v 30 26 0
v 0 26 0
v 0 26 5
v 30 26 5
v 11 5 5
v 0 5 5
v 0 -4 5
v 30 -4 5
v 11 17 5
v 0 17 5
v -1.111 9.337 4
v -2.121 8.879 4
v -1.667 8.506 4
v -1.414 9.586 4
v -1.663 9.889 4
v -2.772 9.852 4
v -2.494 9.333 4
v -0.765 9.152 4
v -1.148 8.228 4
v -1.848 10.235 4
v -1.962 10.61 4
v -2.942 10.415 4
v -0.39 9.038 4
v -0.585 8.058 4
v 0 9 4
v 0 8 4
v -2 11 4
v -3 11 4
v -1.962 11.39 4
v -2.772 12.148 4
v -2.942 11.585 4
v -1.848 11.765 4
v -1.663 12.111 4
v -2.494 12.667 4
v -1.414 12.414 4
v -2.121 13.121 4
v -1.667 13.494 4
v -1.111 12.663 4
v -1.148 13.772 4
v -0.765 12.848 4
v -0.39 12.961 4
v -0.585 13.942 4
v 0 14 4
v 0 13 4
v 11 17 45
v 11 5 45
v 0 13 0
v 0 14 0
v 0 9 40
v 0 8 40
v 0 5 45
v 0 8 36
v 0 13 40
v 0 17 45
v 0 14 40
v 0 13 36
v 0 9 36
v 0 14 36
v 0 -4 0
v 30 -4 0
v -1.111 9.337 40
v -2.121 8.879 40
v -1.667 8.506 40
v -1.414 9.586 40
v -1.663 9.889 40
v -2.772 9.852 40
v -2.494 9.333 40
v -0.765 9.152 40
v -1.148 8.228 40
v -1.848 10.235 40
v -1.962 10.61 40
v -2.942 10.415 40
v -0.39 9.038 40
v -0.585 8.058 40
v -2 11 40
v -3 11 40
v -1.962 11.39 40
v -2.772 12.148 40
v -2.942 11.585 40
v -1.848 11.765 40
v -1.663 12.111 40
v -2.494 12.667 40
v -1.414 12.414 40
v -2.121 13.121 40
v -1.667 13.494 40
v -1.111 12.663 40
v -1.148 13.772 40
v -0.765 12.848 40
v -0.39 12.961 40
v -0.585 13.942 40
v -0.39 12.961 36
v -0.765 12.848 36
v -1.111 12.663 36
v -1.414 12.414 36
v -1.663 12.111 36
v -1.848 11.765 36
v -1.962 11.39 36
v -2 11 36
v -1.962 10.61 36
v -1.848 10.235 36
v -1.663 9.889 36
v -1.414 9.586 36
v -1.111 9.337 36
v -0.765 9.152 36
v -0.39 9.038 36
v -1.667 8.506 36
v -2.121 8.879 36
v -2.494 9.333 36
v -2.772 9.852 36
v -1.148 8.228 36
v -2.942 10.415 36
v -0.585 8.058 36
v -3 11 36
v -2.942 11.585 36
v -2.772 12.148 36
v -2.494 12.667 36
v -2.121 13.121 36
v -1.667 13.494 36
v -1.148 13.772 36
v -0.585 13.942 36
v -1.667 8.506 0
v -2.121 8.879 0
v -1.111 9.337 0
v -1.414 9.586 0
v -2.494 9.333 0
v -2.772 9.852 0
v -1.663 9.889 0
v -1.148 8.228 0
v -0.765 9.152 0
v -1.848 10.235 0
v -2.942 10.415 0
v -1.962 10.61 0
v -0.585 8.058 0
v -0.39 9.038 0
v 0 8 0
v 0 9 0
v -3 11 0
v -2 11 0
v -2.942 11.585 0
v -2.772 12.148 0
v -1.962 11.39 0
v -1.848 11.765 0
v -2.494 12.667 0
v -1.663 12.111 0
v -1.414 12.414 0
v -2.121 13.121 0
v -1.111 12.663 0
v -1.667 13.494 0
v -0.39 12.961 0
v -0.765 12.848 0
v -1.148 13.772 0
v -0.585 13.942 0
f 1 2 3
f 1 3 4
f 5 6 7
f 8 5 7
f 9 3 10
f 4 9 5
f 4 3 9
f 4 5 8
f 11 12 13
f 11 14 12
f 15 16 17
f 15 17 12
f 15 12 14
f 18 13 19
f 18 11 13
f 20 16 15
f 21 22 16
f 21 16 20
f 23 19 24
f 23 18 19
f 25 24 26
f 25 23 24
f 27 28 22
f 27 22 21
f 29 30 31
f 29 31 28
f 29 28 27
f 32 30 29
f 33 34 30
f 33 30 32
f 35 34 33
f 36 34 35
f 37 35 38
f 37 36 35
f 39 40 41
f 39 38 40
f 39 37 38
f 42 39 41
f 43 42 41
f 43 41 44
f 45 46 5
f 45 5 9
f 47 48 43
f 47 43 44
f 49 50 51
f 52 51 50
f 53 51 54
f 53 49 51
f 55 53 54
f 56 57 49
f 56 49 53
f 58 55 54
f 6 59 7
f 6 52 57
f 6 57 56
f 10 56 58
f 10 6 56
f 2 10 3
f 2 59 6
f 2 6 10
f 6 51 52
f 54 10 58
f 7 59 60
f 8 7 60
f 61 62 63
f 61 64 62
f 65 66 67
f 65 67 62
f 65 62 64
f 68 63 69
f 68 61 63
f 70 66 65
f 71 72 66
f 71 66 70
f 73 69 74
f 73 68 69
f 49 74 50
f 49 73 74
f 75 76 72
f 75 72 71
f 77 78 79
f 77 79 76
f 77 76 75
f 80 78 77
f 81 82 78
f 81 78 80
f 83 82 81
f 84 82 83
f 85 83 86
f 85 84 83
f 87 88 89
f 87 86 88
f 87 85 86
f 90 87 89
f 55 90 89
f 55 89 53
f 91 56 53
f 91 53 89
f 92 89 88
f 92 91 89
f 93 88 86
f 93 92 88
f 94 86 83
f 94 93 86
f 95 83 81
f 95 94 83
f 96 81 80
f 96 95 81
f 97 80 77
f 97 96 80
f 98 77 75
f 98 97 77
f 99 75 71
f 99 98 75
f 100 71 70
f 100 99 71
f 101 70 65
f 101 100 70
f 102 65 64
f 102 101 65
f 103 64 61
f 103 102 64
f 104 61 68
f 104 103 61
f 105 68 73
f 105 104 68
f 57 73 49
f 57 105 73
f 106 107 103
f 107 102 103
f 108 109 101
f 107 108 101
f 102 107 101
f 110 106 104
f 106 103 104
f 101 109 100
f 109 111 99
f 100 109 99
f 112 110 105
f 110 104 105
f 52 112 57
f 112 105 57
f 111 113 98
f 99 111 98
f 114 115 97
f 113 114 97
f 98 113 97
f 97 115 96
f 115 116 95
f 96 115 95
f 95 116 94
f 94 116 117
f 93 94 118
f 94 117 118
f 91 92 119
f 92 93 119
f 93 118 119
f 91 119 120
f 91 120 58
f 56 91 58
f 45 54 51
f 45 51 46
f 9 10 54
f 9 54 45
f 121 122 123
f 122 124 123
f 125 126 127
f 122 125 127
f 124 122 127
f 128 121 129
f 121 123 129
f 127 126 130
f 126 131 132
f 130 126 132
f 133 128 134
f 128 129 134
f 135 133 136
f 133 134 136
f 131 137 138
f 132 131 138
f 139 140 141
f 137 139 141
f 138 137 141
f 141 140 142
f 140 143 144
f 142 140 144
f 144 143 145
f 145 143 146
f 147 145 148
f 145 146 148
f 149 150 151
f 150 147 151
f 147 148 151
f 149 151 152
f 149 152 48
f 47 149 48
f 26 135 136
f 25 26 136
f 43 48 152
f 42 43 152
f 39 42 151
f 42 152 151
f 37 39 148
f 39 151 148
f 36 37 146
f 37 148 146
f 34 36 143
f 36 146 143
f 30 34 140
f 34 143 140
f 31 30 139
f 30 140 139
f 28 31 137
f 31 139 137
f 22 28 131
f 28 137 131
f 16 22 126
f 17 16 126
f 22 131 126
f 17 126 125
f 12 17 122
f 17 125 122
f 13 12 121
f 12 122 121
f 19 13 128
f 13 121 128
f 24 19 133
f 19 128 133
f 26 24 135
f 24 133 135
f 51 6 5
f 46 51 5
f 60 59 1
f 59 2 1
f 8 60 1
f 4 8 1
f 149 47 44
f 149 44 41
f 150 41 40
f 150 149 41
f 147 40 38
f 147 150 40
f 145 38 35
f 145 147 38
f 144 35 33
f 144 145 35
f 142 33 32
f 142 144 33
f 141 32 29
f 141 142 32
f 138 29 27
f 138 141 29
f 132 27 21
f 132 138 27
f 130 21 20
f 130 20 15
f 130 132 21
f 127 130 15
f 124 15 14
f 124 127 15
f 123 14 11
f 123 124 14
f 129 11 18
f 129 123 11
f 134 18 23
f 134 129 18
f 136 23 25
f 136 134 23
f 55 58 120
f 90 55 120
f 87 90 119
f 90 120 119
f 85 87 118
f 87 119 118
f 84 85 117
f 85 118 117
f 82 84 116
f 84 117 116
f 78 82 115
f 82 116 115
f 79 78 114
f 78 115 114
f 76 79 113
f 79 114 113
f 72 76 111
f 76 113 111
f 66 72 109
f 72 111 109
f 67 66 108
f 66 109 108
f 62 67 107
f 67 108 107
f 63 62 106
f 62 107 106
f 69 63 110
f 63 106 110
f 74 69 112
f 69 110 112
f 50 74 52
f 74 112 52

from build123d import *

# Parameters (mm, degrees)
EXTRUDE002_DEPTH = 4
EXTRUDE003_DEPTH = 4
SKETCH_W         = 30
SKETCH_H         = 30
EXTRUDE_DEPTH    = 5
SKETCH001_W      = 11
SKETCH001_H      = 12
EXTRUDE001_DEPTH = 45


with BuildPart() as extrude002:
    # Sketch002 → Extrude002 (new body)
    with BuildSketch(Plane.XY):
        with BuildLine():
            ThreePointArc((0, 13.999913), (-3, 10.999913), (0, 7.999913))
            Line((0, 7.999913), (0, 8.999913))
            ThreePointArc((0, 12.999913), (-2, 10.999913), (0, 8.999913))
            Line((0, 13.999913), (0, 12.999913))
        make_face()
    extrude(amount=EXTRUDE002_DEPTH)


with BuildPart() as extrude003:
    # Sketch002 → Extrude003 (new body)
    with BuildSketch(Plane.XY):
        with BuildLine():
            ThreePointArc((0, 13.999913), (-3, 10.999913), (0, 7.999913))
            Line((0, 7.999913), (0, 8.999913))
            ThreePointArc((0, 12.999913), (-2, 10.999913), (0, 8.999913))
            Line((0, 13.999913), (0, 12.999913))
        make_face()
    extrude(amount=EXTRUDE003_DEPTH)


with BuildPart() as extrude003_1:
    # Extrude003 placement: moved
    add(extrude003.part.moved(Location((0, 0, 36))))


with BuildPart() as fusion:
    # Sketch → Extrude (new body)
    with BuildSketch(Plane.XY):
        with Locations((15, 11)):
            Rectangle(SKETCH_W, SKETCH_H)
    extrude(amount=EXTRUDE_DEPTH)

    # Fusion: union Extrude003
    add(extrude003_1.part)


with BuildPart() as fusion001:
    # Sketch001 → Extrude001 (new body)
    with BuildSketch(Plane.XY):
        with Locations((5.5, 11)):
            Rectangle(SKETCH001_W, SKETCH001_H)
    extrude(amount=EXTRUDE001_DEPTH)

    # Fusion001: union Fusion
    add(fusion.part)


solid = Compound([extrude002.part, fusion001.part])
